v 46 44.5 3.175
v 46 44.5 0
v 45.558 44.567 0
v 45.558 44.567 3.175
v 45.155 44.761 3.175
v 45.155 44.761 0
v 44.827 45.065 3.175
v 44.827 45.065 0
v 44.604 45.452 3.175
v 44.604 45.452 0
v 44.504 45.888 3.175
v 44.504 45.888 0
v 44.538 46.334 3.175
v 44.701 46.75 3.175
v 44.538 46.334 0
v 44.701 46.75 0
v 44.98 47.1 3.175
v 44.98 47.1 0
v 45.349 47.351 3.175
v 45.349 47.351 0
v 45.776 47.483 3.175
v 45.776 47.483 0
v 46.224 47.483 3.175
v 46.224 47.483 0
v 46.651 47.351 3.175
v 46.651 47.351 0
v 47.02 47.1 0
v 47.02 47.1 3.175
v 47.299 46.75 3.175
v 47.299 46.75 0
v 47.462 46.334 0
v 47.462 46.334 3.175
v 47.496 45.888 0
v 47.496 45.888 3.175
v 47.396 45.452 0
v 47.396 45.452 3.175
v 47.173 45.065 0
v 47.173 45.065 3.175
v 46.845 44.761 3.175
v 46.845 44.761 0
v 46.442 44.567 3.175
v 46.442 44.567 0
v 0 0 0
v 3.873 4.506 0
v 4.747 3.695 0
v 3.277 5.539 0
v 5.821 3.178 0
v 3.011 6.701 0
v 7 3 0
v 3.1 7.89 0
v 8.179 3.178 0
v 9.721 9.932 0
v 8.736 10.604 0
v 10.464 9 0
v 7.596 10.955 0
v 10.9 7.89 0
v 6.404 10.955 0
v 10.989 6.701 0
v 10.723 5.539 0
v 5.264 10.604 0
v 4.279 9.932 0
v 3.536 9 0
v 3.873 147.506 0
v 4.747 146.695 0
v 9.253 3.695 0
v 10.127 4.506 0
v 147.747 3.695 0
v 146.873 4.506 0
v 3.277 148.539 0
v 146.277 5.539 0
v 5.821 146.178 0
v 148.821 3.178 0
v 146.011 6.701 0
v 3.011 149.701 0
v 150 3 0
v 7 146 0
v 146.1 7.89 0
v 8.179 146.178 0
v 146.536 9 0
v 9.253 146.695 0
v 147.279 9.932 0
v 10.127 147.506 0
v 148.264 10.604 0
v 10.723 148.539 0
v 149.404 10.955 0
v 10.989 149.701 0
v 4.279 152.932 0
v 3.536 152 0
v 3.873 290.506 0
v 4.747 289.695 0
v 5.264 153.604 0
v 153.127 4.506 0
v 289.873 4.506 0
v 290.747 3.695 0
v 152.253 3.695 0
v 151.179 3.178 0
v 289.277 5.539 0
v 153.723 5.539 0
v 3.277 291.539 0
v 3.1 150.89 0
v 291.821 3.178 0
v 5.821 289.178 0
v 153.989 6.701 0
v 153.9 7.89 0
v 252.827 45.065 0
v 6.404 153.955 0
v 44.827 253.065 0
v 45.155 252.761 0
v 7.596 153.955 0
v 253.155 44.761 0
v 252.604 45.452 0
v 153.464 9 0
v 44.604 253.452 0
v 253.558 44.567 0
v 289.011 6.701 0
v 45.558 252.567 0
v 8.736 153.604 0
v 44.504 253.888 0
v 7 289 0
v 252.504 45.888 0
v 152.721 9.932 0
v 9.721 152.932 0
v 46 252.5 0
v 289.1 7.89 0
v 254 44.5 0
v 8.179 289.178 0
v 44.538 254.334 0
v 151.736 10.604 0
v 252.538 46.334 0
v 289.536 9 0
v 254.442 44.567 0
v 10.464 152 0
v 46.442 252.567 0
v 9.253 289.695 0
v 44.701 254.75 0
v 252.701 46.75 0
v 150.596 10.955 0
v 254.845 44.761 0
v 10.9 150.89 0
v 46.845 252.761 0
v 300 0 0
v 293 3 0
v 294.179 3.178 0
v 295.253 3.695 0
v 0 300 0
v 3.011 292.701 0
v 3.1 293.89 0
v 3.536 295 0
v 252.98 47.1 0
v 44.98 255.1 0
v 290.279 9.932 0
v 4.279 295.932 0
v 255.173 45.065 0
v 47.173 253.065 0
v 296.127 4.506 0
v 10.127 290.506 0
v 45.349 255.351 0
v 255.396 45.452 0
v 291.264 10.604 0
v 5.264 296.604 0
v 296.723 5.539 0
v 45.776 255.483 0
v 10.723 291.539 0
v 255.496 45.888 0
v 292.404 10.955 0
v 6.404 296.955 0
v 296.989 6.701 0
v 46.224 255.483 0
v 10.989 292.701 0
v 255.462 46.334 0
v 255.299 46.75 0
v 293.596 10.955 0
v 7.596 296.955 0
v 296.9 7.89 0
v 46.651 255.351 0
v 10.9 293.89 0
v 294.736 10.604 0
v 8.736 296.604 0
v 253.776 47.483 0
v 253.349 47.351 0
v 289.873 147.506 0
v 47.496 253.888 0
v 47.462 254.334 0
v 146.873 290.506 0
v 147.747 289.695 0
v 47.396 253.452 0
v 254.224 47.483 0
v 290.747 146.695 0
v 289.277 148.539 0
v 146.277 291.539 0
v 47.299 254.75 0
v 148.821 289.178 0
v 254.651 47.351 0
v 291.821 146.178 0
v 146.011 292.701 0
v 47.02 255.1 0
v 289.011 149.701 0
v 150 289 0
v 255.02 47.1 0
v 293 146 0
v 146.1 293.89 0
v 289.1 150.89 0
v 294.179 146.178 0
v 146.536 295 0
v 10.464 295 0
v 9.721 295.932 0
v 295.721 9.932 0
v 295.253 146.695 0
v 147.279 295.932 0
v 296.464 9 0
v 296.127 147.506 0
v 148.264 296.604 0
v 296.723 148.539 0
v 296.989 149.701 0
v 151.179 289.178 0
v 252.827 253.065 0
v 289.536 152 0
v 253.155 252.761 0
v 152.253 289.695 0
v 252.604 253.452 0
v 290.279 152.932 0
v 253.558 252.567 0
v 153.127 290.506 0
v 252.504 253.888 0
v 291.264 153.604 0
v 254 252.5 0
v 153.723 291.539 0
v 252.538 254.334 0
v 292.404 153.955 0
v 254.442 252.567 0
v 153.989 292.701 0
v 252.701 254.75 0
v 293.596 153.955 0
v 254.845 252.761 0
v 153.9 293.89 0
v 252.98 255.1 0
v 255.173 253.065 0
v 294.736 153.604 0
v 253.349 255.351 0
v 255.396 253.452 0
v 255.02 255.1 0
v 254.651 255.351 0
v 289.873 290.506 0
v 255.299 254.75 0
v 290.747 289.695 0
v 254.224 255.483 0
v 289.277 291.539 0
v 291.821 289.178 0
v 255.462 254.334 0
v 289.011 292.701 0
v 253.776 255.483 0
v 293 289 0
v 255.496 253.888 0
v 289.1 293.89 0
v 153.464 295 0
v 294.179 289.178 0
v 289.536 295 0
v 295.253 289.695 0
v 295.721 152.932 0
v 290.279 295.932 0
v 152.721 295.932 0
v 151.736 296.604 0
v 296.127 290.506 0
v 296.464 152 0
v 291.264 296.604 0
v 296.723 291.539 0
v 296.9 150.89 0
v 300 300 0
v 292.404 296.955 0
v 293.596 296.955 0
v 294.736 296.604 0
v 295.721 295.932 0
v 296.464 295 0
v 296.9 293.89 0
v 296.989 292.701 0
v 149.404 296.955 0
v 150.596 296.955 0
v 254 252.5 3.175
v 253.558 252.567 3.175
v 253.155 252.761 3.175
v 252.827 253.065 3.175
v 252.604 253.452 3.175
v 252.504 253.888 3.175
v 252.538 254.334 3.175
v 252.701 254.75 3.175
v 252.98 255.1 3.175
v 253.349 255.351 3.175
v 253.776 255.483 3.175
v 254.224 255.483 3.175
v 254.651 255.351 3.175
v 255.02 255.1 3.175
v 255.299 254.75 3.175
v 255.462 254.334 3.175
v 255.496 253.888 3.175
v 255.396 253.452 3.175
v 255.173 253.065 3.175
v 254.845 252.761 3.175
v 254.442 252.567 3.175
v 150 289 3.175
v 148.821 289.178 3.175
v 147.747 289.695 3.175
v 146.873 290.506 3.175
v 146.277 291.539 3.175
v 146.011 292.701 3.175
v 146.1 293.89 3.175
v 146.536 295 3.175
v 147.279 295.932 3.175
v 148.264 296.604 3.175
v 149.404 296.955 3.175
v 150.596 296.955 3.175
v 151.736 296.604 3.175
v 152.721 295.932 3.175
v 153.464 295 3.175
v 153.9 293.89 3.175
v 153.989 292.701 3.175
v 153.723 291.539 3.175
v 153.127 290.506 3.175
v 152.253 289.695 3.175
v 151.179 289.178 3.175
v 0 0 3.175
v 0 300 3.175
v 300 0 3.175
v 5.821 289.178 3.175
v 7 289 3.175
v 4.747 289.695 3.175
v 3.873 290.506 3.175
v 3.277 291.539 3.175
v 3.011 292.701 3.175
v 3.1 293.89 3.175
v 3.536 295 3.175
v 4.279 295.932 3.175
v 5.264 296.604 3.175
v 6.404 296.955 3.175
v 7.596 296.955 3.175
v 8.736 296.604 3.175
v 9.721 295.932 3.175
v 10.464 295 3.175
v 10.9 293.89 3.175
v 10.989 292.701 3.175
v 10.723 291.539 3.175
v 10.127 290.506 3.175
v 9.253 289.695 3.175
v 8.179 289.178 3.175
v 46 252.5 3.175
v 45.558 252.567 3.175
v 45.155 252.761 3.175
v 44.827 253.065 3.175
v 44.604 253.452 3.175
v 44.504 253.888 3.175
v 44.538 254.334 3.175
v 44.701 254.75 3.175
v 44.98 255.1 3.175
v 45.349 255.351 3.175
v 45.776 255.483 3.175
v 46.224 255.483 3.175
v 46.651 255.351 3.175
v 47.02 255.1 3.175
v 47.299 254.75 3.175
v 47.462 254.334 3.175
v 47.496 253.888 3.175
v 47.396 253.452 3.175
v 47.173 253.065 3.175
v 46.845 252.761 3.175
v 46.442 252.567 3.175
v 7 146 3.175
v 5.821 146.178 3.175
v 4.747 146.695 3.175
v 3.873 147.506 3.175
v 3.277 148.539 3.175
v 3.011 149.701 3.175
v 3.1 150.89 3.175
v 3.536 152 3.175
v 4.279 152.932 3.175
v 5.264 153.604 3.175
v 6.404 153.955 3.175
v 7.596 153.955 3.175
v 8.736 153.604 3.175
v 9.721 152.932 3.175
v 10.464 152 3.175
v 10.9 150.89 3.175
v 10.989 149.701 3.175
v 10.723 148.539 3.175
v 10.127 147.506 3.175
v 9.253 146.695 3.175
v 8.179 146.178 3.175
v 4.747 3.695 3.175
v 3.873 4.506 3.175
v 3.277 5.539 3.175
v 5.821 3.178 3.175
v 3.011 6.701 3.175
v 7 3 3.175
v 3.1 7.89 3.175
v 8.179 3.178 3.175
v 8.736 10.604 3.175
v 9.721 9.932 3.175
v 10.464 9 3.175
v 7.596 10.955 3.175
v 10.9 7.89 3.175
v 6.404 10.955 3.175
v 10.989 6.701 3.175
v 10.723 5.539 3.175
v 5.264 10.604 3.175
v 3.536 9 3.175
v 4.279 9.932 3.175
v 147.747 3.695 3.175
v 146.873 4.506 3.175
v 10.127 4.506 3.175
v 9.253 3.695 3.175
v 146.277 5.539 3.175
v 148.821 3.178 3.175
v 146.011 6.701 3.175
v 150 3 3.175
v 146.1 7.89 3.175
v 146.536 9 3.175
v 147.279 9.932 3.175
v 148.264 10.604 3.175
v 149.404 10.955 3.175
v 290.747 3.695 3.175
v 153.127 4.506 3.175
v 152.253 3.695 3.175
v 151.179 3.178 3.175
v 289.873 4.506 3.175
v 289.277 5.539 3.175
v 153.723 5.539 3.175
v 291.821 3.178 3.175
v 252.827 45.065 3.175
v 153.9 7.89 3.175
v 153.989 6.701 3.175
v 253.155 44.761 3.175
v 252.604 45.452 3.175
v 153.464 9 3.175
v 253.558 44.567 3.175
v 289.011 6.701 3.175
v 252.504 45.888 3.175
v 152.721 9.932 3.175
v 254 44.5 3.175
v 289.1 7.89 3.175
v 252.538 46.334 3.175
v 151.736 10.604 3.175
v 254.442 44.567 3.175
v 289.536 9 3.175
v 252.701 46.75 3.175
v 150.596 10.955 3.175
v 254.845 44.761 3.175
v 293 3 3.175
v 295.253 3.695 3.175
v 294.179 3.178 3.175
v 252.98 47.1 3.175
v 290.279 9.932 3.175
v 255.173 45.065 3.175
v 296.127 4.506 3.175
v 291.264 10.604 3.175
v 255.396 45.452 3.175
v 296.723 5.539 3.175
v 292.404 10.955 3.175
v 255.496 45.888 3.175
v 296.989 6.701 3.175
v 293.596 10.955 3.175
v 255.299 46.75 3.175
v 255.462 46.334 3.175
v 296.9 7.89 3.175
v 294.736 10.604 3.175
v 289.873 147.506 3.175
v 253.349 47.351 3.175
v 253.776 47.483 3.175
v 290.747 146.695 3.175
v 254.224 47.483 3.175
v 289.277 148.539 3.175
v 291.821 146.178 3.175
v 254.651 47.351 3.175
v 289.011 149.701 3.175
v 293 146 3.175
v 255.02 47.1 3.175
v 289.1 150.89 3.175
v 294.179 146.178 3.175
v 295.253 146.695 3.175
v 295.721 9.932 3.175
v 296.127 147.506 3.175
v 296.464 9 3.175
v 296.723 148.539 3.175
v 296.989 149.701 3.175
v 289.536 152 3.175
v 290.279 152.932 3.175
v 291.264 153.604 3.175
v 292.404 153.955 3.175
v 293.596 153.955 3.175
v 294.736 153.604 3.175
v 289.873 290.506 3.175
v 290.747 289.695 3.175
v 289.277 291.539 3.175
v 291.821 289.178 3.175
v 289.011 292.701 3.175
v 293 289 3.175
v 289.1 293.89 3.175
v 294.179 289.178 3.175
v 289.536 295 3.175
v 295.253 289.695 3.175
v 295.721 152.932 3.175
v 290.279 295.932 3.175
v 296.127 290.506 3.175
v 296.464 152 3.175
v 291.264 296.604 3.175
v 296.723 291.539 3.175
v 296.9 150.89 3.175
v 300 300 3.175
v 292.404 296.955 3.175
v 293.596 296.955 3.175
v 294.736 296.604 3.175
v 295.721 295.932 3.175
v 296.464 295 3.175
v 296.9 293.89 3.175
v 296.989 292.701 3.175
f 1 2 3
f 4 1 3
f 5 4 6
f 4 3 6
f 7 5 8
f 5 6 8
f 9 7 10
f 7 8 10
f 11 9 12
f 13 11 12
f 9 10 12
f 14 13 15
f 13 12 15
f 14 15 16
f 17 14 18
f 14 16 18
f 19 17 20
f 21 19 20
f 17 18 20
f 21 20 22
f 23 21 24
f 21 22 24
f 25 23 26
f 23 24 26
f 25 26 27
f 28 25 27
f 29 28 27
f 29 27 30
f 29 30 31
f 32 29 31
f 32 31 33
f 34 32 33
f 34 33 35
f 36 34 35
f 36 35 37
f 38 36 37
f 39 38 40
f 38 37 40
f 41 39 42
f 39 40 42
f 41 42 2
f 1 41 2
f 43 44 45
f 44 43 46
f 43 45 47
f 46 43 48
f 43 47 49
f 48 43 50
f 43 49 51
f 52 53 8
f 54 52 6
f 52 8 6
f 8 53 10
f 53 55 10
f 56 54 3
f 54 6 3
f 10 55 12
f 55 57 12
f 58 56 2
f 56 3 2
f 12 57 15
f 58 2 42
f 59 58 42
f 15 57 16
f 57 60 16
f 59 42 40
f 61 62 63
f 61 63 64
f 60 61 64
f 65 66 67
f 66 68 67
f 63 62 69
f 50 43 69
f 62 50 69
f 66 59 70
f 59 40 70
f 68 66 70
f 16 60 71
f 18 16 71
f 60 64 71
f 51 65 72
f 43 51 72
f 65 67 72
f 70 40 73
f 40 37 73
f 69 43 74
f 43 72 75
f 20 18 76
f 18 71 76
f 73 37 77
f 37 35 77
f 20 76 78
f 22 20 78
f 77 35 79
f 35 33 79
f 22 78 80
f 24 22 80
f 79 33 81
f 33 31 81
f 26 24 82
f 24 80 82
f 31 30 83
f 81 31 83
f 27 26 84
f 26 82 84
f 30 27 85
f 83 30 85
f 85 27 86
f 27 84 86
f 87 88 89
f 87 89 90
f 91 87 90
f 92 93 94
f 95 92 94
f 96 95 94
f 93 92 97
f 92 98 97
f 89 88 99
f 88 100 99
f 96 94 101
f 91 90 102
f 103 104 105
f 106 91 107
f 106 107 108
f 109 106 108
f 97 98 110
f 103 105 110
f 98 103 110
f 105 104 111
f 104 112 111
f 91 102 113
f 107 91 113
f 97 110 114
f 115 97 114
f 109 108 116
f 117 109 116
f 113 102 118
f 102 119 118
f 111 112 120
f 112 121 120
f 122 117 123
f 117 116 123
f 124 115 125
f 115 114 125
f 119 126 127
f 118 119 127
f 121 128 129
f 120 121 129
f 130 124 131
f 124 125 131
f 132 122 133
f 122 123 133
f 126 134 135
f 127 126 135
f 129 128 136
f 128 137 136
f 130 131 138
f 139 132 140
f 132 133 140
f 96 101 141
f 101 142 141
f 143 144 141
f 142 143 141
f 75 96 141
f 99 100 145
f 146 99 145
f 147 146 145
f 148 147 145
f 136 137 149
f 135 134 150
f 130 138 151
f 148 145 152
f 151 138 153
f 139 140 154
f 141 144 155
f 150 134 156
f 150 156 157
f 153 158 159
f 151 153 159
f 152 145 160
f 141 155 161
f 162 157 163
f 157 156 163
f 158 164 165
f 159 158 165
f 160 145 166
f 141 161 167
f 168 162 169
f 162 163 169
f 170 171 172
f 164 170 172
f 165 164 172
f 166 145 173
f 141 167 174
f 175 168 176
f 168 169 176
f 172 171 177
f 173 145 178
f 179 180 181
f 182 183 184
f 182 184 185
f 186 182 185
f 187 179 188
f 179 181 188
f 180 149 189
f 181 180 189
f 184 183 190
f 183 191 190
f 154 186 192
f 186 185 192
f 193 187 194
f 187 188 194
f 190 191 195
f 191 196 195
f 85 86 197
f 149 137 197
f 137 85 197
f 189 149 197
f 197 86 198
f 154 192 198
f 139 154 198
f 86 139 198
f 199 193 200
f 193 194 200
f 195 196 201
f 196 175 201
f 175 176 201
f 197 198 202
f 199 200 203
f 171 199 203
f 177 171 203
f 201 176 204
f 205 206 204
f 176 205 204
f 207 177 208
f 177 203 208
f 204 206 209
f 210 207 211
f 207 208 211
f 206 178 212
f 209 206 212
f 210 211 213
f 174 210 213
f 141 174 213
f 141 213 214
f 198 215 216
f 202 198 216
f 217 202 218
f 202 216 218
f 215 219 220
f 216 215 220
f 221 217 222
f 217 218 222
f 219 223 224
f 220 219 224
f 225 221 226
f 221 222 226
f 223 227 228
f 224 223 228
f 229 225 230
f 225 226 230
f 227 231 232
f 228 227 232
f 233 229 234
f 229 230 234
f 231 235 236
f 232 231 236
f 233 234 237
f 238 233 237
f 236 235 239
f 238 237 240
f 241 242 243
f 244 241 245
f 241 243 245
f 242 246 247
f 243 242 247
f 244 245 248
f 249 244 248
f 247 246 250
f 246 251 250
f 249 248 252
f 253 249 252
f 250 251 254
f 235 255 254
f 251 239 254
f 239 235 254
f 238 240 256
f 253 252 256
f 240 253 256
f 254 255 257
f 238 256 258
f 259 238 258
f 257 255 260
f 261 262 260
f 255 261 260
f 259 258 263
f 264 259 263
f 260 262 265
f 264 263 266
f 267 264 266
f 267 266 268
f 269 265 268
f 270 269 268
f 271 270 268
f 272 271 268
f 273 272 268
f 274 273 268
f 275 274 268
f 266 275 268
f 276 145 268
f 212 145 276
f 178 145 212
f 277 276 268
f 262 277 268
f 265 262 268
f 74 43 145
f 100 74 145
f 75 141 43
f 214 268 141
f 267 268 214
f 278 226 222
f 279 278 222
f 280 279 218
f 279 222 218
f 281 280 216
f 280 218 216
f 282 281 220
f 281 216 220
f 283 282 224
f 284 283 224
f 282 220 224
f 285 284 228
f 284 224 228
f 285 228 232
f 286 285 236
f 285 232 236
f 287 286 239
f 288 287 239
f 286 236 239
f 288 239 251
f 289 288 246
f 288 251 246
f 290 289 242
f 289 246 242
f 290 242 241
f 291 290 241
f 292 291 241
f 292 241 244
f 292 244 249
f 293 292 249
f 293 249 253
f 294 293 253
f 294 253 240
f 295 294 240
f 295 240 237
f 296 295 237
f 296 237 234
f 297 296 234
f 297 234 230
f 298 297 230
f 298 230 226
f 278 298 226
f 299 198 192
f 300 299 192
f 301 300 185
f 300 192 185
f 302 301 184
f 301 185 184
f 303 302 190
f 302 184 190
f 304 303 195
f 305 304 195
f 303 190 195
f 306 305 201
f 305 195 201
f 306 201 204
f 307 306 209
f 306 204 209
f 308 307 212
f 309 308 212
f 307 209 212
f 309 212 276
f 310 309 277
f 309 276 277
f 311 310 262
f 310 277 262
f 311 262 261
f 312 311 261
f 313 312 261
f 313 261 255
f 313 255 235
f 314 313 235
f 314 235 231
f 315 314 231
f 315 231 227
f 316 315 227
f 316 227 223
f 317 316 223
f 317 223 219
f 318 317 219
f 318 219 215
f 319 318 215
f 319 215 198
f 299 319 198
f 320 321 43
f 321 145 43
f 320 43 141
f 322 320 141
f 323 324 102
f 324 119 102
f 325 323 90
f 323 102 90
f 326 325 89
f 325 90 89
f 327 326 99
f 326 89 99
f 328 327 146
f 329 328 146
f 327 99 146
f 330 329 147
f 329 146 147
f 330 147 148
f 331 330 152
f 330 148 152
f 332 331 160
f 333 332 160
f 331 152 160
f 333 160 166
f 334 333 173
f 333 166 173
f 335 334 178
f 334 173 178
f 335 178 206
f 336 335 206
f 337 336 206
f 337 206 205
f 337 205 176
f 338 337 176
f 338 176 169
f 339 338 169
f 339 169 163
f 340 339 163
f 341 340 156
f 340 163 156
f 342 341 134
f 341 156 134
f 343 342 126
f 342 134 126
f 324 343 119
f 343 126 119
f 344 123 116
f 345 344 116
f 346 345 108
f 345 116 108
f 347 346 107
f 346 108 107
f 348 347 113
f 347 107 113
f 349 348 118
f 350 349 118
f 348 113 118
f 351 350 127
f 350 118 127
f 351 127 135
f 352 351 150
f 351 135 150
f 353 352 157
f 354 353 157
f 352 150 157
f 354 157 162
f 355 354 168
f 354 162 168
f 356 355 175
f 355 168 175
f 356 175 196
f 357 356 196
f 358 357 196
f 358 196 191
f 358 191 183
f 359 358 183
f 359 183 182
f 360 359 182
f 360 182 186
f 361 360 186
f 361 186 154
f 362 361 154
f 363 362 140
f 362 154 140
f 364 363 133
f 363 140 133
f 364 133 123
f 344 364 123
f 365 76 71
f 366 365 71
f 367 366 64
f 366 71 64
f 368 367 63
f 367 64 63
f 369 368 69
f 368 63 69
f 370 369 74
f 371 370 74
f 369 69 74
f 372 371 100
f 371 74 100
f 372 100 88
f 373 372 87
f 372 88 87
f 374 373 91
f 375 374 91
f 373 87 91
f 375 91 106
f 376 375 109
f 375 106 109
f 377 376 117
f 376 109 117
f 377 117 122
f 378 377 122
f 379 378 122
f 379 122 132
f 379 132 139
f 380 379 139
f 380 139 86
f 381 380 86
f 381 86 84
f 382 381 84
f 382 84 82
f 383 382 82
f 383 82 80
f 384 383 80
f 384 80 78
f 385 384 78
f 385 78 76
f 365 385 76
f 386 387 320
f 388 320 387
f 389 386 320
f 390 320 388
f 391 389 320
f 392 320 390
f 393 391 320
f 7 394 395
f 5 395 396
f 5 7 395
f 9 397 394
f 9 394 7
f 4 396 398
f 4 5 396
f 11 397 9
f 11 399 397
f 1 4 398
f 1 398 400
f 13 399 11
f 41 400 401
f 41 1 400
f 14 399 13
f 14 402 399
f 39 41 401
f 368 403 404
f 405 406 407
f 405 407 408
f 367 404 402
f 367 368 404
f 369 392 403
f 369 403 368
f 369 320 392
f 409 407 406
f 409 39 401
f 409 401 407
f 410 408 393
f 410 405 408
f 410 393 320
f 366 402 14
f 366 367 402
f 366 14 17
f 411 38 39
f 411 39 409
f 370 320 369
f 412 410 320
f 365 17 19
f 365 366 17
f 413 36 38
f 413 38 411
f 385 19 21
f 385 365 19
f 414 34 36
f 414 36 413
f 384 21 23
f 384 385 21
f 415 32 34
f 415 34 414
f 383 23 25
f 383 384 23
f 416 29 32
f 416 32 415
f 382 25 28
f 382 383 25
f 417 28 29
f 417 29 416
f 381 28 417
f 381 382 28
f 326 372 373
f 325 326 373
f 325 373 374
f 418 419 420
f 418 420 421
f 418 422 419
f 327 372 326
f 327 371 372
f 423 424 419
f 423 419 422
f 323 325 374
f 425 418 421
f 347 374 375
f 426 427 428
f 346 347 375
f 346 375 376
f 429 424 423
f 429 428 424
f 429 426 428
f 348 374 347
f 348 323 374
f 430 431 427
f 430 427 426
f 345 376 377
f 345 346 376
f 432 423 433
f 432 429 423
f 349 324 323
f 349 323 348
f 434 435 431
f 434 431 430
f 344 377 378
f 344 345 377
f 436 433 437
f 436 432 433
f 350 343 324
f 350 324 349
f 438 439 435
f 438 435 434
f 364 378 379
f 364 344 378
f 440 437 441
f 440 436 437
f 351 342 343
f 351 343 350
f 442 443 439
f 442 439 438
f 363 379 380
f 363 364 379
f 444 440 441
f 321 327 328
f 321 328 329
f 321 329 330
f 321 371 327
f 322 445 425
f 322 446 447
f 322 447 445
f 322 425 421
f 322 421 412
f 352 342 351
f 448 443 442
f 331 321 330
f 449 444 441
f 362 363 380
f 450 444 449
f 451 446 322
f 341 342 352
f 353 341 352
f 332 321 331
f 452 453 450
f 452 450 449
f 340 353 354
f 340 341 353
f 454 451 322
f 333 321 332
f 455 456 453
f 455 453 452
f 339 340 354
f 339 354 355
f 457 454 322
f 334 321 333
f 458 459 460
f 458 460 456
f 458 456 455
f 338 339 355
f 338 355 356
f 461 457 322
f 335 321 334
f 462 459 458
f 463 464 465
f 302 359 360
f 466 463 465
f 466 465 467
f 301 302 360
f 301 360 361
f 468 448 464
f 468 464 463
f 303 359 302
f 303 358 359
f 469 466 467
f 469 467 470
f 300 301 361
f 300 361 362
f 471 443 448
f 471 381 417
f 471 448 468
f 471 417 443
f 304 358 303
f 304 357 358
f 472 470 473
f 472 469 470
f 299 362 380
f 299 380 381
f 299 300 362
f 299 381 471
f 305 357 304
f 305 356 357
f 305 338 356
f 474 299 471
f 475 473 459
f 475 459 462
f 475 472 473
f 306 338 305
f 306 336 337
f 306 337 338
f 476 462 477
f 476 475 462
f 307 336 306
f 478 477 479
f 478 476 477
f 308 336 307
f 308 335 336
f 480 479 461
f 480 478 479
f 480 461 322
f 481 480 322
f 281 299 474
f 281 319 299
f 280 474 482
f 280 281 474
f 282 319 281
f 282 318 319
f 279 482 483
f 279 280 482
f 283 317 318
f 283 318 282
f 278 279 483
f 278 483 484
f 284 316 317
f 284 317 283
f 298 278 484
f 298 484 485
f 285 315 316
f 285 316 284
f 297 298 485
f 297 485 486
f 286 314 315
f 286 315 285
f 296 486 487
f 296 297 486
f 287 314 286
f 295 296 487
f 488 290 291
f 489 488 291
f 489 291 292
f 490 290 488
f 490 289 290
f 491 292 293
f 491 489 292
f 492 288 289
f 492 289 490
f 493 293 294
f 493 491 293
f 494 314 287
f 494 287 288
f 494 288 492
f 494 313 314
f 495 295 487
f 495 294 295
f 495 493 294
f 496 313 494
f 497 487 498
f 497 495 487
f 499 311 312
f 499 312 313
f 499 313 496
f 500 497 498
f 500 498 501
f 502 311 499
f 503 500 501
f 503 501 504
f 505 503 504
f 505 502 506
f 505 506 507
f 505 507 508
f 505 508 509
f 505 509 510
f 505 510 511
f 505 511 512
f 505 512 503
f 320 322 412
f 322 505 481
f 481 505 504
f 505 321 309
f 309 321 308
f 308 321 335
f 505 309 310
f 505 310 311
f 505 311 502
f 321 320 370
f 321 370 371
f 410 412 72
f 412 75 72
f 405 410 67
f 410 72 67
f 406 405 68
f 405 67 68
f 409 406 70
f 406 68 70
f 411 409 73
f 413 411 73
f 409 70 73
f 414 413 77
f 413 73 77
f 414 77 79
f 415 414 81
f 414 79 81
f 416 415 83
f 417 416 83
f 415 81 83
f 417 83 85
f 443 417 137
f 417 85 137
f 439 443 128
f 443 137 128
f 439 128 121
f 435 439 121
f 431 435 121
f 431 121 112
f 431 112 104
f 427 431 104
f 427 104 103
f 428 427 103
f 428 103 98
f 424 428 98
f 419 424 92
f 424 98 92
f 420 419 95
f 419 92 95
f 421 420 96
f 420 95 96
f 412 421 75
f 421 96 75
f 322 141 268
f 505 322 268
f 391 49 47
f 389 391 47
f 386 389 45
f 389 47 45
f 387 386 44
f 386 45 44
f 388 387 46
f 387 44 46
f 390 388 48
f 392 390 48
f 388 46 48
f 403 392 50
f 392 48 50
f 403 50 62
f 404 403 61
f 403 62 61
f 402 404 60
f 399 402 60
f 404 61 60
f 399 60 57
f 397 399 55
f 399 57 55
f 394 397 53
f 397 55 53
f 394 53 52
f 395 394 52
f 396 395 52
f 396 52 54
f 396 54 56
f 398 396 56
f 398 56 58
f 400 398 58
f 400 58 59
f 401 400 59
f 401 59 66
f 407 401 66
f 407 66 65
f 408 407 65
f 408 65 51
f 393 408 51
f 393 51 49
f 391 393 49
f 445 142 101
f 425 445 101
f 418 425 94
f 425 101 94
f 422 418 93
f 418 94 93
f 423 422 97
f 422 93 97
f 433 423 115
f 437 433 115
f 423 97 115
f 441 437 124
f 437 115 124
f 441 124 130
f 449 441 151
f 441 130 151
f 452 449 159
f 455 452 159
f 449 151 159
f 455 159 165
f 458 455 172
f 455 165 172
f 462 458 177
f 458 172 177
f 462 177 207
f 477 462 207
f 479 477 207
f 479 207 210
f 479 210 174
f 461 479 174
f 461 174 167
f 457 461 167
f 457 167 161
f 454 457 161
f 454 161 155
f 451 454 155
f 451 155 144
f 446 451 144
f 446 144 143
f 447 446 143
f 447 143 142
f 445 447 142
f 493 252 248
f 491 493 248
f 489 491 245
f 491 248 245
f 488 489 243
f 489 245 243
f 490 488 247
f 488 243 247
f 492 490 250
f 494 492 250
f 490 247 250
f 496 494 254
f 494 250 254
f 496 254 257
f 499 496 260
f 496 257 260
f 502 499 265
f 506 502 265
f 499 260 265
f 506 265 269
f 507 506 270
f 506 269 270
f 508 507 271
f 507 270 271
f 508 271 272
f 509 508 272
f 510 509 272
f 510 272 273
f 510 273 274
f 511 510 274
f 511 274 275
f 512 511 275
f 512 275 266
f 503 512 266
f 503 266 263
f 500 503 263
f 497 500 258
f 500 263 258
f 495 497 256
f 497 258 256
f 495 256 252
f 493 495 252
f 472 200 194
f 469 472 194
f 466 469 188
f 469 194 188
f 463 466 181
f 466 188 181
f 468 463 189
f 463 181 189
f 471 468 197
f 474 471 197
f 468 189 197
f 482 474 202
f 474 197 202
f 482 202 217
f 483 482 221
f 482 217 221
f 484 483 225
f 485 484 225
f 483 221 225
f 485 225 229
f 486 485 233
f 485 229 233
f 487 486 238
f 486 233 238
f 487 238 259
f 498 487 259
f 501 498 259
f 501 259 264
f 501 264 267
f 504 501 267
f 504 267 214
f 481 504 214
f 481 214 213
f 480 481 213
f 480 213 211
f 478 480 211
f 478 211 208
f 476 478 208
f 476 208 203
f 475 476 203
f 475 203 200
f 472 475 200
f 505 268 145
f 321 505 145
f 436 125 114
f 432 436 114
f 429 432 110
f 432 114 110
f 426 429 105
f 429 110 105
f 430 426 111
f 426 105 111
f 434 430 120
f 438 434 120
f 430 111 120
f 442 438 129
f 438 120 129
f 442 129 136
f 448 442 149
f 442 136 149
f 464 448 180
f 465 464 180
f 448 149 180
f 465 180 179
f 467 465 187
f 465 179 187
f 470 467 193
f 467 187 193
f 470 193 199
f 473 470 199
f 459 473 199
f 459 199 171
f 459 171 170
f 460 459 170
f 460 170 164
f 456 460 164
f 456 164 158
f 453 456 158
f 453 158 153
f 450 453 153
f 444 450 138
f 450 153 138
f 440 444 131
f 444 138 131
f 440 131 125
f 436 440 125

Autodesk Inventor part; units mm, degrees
ref_plane "YZ Plane" through (0, 0, 0) normal (1, 0, 0) x (0, 1, 0)
ref_plane "XZ Plane" through (0, 0, 0) normal (0, 1, 0) x (-1, 0, 0)
ref_plane "XY Plane" through (0, 0, 0) normal (0, 0, 1) x (1, 0, 0)
sketch "Sketch1" plane through (0, 0, 0) normal (0, 0, 1) x (1, 0, 0)
  line L0 (0, 0) -> (300, 0)
  line L1 (300, 0) -> (300, 300)
  line L2 (300, 300) -> (0, 300)
  line L3 (0, 300) -> (0, 0)
  dimension "d0" = 300
  dimension "d1" = 300
extrude "Extrusion1" add sketch "Sketch1" along normal blind 3.175
sketch "Sketch2" plane through (0, 0, 3.175) normal (0, 0, 1) x (1, 0, 0)
  line L0 (0, 300) -> (0, 0) projected
  line L1 (300, 300) -> (0, 300) projected
  line L2 (300, 0) -> (300, 300) projected
  line L3 (0, 0) -> (300, 0) projected
  point P0 (7, 293)
  point P1 (293, 293)
  point P2 (293, 7)
  point P3 (7, 7)
  dimension "d4" = 7
  dimension "d5" = 7
  dimension "d6" = 7
  dimension "d7" = 7
  dimension "d8" = 7
  dimension "d9" = 7
  dimension "d10" = 7
  dimension "d11" = 7
hole "Hole1" at (7, 293, 3.175) at (293, 293, 3.175) at (293, 7, 3.175) at (7, 7, 3.175) direction (0, 0, -1) diameter 8 depth 25.4 tip angle 118
sketch "Sketch3" plane through (0, 0, 3.175) normal (0, 0, 1) x (1, 0, 0)
  line L0 (0, 300) -> (0, 0) projected
  line L1 (0, 0) -> (300, 0) projected
  line L2 (300, 0) -> (300, 300) projected
  point P0 (46, 254)
  point P1 (254, 254)
  point P2 (254, 46)
  point P3 (46, 46)
  dimension "d19" = 208
  dimension "d20" = 208
  dimension "d21" = 208
  dimension "d22" = 46
  dimension "d23" = 46
  dimension "d24" = 46
  dimension "d25" = 208
  dimension "d26" = 46
hole "Hole2" at (46, 254, 3.175) at (254, 254, 3.175) at (254, 46, 3.175) at (46, 46, 3.175) direction (0, 0, -1) diameter 3 depth 25.4 tip angle 118
sketch "Sketch4" plane through (0, 0, 3.175) normal (0, 0, 1) x (1, 0, 0)
  line L0 (0, 0) -> (300, 0) projected
  line L1 (0, 300) -> (0, 0) projected
  line L2 (300, 0) -> (300, 300) projected
  line L3 (300, 300) -> (0, 300) projected
  point P0 (150, 7)
  point P1 (293, 150)
  point P2 (150, 293)
  point P3 (7, 150)
  dimension "d34" = 150
  dimension "d35" = 7
  dimension "d36" = 7
  dimension "d37" = 150
  dimension "d38" = 7
  dimension "d39" = 7
  dimension "d40" = 150
  dimension "d41" = 150
hole "Hole3" at (150, 7, 3.175) at (293, 150, 3.175) at (150, 293, 3.175) at (7, 150, 3.175) direction (0, 0, -1) diameter 8 depth 25.4 tip angle 118
properties part number "bed plate square"
